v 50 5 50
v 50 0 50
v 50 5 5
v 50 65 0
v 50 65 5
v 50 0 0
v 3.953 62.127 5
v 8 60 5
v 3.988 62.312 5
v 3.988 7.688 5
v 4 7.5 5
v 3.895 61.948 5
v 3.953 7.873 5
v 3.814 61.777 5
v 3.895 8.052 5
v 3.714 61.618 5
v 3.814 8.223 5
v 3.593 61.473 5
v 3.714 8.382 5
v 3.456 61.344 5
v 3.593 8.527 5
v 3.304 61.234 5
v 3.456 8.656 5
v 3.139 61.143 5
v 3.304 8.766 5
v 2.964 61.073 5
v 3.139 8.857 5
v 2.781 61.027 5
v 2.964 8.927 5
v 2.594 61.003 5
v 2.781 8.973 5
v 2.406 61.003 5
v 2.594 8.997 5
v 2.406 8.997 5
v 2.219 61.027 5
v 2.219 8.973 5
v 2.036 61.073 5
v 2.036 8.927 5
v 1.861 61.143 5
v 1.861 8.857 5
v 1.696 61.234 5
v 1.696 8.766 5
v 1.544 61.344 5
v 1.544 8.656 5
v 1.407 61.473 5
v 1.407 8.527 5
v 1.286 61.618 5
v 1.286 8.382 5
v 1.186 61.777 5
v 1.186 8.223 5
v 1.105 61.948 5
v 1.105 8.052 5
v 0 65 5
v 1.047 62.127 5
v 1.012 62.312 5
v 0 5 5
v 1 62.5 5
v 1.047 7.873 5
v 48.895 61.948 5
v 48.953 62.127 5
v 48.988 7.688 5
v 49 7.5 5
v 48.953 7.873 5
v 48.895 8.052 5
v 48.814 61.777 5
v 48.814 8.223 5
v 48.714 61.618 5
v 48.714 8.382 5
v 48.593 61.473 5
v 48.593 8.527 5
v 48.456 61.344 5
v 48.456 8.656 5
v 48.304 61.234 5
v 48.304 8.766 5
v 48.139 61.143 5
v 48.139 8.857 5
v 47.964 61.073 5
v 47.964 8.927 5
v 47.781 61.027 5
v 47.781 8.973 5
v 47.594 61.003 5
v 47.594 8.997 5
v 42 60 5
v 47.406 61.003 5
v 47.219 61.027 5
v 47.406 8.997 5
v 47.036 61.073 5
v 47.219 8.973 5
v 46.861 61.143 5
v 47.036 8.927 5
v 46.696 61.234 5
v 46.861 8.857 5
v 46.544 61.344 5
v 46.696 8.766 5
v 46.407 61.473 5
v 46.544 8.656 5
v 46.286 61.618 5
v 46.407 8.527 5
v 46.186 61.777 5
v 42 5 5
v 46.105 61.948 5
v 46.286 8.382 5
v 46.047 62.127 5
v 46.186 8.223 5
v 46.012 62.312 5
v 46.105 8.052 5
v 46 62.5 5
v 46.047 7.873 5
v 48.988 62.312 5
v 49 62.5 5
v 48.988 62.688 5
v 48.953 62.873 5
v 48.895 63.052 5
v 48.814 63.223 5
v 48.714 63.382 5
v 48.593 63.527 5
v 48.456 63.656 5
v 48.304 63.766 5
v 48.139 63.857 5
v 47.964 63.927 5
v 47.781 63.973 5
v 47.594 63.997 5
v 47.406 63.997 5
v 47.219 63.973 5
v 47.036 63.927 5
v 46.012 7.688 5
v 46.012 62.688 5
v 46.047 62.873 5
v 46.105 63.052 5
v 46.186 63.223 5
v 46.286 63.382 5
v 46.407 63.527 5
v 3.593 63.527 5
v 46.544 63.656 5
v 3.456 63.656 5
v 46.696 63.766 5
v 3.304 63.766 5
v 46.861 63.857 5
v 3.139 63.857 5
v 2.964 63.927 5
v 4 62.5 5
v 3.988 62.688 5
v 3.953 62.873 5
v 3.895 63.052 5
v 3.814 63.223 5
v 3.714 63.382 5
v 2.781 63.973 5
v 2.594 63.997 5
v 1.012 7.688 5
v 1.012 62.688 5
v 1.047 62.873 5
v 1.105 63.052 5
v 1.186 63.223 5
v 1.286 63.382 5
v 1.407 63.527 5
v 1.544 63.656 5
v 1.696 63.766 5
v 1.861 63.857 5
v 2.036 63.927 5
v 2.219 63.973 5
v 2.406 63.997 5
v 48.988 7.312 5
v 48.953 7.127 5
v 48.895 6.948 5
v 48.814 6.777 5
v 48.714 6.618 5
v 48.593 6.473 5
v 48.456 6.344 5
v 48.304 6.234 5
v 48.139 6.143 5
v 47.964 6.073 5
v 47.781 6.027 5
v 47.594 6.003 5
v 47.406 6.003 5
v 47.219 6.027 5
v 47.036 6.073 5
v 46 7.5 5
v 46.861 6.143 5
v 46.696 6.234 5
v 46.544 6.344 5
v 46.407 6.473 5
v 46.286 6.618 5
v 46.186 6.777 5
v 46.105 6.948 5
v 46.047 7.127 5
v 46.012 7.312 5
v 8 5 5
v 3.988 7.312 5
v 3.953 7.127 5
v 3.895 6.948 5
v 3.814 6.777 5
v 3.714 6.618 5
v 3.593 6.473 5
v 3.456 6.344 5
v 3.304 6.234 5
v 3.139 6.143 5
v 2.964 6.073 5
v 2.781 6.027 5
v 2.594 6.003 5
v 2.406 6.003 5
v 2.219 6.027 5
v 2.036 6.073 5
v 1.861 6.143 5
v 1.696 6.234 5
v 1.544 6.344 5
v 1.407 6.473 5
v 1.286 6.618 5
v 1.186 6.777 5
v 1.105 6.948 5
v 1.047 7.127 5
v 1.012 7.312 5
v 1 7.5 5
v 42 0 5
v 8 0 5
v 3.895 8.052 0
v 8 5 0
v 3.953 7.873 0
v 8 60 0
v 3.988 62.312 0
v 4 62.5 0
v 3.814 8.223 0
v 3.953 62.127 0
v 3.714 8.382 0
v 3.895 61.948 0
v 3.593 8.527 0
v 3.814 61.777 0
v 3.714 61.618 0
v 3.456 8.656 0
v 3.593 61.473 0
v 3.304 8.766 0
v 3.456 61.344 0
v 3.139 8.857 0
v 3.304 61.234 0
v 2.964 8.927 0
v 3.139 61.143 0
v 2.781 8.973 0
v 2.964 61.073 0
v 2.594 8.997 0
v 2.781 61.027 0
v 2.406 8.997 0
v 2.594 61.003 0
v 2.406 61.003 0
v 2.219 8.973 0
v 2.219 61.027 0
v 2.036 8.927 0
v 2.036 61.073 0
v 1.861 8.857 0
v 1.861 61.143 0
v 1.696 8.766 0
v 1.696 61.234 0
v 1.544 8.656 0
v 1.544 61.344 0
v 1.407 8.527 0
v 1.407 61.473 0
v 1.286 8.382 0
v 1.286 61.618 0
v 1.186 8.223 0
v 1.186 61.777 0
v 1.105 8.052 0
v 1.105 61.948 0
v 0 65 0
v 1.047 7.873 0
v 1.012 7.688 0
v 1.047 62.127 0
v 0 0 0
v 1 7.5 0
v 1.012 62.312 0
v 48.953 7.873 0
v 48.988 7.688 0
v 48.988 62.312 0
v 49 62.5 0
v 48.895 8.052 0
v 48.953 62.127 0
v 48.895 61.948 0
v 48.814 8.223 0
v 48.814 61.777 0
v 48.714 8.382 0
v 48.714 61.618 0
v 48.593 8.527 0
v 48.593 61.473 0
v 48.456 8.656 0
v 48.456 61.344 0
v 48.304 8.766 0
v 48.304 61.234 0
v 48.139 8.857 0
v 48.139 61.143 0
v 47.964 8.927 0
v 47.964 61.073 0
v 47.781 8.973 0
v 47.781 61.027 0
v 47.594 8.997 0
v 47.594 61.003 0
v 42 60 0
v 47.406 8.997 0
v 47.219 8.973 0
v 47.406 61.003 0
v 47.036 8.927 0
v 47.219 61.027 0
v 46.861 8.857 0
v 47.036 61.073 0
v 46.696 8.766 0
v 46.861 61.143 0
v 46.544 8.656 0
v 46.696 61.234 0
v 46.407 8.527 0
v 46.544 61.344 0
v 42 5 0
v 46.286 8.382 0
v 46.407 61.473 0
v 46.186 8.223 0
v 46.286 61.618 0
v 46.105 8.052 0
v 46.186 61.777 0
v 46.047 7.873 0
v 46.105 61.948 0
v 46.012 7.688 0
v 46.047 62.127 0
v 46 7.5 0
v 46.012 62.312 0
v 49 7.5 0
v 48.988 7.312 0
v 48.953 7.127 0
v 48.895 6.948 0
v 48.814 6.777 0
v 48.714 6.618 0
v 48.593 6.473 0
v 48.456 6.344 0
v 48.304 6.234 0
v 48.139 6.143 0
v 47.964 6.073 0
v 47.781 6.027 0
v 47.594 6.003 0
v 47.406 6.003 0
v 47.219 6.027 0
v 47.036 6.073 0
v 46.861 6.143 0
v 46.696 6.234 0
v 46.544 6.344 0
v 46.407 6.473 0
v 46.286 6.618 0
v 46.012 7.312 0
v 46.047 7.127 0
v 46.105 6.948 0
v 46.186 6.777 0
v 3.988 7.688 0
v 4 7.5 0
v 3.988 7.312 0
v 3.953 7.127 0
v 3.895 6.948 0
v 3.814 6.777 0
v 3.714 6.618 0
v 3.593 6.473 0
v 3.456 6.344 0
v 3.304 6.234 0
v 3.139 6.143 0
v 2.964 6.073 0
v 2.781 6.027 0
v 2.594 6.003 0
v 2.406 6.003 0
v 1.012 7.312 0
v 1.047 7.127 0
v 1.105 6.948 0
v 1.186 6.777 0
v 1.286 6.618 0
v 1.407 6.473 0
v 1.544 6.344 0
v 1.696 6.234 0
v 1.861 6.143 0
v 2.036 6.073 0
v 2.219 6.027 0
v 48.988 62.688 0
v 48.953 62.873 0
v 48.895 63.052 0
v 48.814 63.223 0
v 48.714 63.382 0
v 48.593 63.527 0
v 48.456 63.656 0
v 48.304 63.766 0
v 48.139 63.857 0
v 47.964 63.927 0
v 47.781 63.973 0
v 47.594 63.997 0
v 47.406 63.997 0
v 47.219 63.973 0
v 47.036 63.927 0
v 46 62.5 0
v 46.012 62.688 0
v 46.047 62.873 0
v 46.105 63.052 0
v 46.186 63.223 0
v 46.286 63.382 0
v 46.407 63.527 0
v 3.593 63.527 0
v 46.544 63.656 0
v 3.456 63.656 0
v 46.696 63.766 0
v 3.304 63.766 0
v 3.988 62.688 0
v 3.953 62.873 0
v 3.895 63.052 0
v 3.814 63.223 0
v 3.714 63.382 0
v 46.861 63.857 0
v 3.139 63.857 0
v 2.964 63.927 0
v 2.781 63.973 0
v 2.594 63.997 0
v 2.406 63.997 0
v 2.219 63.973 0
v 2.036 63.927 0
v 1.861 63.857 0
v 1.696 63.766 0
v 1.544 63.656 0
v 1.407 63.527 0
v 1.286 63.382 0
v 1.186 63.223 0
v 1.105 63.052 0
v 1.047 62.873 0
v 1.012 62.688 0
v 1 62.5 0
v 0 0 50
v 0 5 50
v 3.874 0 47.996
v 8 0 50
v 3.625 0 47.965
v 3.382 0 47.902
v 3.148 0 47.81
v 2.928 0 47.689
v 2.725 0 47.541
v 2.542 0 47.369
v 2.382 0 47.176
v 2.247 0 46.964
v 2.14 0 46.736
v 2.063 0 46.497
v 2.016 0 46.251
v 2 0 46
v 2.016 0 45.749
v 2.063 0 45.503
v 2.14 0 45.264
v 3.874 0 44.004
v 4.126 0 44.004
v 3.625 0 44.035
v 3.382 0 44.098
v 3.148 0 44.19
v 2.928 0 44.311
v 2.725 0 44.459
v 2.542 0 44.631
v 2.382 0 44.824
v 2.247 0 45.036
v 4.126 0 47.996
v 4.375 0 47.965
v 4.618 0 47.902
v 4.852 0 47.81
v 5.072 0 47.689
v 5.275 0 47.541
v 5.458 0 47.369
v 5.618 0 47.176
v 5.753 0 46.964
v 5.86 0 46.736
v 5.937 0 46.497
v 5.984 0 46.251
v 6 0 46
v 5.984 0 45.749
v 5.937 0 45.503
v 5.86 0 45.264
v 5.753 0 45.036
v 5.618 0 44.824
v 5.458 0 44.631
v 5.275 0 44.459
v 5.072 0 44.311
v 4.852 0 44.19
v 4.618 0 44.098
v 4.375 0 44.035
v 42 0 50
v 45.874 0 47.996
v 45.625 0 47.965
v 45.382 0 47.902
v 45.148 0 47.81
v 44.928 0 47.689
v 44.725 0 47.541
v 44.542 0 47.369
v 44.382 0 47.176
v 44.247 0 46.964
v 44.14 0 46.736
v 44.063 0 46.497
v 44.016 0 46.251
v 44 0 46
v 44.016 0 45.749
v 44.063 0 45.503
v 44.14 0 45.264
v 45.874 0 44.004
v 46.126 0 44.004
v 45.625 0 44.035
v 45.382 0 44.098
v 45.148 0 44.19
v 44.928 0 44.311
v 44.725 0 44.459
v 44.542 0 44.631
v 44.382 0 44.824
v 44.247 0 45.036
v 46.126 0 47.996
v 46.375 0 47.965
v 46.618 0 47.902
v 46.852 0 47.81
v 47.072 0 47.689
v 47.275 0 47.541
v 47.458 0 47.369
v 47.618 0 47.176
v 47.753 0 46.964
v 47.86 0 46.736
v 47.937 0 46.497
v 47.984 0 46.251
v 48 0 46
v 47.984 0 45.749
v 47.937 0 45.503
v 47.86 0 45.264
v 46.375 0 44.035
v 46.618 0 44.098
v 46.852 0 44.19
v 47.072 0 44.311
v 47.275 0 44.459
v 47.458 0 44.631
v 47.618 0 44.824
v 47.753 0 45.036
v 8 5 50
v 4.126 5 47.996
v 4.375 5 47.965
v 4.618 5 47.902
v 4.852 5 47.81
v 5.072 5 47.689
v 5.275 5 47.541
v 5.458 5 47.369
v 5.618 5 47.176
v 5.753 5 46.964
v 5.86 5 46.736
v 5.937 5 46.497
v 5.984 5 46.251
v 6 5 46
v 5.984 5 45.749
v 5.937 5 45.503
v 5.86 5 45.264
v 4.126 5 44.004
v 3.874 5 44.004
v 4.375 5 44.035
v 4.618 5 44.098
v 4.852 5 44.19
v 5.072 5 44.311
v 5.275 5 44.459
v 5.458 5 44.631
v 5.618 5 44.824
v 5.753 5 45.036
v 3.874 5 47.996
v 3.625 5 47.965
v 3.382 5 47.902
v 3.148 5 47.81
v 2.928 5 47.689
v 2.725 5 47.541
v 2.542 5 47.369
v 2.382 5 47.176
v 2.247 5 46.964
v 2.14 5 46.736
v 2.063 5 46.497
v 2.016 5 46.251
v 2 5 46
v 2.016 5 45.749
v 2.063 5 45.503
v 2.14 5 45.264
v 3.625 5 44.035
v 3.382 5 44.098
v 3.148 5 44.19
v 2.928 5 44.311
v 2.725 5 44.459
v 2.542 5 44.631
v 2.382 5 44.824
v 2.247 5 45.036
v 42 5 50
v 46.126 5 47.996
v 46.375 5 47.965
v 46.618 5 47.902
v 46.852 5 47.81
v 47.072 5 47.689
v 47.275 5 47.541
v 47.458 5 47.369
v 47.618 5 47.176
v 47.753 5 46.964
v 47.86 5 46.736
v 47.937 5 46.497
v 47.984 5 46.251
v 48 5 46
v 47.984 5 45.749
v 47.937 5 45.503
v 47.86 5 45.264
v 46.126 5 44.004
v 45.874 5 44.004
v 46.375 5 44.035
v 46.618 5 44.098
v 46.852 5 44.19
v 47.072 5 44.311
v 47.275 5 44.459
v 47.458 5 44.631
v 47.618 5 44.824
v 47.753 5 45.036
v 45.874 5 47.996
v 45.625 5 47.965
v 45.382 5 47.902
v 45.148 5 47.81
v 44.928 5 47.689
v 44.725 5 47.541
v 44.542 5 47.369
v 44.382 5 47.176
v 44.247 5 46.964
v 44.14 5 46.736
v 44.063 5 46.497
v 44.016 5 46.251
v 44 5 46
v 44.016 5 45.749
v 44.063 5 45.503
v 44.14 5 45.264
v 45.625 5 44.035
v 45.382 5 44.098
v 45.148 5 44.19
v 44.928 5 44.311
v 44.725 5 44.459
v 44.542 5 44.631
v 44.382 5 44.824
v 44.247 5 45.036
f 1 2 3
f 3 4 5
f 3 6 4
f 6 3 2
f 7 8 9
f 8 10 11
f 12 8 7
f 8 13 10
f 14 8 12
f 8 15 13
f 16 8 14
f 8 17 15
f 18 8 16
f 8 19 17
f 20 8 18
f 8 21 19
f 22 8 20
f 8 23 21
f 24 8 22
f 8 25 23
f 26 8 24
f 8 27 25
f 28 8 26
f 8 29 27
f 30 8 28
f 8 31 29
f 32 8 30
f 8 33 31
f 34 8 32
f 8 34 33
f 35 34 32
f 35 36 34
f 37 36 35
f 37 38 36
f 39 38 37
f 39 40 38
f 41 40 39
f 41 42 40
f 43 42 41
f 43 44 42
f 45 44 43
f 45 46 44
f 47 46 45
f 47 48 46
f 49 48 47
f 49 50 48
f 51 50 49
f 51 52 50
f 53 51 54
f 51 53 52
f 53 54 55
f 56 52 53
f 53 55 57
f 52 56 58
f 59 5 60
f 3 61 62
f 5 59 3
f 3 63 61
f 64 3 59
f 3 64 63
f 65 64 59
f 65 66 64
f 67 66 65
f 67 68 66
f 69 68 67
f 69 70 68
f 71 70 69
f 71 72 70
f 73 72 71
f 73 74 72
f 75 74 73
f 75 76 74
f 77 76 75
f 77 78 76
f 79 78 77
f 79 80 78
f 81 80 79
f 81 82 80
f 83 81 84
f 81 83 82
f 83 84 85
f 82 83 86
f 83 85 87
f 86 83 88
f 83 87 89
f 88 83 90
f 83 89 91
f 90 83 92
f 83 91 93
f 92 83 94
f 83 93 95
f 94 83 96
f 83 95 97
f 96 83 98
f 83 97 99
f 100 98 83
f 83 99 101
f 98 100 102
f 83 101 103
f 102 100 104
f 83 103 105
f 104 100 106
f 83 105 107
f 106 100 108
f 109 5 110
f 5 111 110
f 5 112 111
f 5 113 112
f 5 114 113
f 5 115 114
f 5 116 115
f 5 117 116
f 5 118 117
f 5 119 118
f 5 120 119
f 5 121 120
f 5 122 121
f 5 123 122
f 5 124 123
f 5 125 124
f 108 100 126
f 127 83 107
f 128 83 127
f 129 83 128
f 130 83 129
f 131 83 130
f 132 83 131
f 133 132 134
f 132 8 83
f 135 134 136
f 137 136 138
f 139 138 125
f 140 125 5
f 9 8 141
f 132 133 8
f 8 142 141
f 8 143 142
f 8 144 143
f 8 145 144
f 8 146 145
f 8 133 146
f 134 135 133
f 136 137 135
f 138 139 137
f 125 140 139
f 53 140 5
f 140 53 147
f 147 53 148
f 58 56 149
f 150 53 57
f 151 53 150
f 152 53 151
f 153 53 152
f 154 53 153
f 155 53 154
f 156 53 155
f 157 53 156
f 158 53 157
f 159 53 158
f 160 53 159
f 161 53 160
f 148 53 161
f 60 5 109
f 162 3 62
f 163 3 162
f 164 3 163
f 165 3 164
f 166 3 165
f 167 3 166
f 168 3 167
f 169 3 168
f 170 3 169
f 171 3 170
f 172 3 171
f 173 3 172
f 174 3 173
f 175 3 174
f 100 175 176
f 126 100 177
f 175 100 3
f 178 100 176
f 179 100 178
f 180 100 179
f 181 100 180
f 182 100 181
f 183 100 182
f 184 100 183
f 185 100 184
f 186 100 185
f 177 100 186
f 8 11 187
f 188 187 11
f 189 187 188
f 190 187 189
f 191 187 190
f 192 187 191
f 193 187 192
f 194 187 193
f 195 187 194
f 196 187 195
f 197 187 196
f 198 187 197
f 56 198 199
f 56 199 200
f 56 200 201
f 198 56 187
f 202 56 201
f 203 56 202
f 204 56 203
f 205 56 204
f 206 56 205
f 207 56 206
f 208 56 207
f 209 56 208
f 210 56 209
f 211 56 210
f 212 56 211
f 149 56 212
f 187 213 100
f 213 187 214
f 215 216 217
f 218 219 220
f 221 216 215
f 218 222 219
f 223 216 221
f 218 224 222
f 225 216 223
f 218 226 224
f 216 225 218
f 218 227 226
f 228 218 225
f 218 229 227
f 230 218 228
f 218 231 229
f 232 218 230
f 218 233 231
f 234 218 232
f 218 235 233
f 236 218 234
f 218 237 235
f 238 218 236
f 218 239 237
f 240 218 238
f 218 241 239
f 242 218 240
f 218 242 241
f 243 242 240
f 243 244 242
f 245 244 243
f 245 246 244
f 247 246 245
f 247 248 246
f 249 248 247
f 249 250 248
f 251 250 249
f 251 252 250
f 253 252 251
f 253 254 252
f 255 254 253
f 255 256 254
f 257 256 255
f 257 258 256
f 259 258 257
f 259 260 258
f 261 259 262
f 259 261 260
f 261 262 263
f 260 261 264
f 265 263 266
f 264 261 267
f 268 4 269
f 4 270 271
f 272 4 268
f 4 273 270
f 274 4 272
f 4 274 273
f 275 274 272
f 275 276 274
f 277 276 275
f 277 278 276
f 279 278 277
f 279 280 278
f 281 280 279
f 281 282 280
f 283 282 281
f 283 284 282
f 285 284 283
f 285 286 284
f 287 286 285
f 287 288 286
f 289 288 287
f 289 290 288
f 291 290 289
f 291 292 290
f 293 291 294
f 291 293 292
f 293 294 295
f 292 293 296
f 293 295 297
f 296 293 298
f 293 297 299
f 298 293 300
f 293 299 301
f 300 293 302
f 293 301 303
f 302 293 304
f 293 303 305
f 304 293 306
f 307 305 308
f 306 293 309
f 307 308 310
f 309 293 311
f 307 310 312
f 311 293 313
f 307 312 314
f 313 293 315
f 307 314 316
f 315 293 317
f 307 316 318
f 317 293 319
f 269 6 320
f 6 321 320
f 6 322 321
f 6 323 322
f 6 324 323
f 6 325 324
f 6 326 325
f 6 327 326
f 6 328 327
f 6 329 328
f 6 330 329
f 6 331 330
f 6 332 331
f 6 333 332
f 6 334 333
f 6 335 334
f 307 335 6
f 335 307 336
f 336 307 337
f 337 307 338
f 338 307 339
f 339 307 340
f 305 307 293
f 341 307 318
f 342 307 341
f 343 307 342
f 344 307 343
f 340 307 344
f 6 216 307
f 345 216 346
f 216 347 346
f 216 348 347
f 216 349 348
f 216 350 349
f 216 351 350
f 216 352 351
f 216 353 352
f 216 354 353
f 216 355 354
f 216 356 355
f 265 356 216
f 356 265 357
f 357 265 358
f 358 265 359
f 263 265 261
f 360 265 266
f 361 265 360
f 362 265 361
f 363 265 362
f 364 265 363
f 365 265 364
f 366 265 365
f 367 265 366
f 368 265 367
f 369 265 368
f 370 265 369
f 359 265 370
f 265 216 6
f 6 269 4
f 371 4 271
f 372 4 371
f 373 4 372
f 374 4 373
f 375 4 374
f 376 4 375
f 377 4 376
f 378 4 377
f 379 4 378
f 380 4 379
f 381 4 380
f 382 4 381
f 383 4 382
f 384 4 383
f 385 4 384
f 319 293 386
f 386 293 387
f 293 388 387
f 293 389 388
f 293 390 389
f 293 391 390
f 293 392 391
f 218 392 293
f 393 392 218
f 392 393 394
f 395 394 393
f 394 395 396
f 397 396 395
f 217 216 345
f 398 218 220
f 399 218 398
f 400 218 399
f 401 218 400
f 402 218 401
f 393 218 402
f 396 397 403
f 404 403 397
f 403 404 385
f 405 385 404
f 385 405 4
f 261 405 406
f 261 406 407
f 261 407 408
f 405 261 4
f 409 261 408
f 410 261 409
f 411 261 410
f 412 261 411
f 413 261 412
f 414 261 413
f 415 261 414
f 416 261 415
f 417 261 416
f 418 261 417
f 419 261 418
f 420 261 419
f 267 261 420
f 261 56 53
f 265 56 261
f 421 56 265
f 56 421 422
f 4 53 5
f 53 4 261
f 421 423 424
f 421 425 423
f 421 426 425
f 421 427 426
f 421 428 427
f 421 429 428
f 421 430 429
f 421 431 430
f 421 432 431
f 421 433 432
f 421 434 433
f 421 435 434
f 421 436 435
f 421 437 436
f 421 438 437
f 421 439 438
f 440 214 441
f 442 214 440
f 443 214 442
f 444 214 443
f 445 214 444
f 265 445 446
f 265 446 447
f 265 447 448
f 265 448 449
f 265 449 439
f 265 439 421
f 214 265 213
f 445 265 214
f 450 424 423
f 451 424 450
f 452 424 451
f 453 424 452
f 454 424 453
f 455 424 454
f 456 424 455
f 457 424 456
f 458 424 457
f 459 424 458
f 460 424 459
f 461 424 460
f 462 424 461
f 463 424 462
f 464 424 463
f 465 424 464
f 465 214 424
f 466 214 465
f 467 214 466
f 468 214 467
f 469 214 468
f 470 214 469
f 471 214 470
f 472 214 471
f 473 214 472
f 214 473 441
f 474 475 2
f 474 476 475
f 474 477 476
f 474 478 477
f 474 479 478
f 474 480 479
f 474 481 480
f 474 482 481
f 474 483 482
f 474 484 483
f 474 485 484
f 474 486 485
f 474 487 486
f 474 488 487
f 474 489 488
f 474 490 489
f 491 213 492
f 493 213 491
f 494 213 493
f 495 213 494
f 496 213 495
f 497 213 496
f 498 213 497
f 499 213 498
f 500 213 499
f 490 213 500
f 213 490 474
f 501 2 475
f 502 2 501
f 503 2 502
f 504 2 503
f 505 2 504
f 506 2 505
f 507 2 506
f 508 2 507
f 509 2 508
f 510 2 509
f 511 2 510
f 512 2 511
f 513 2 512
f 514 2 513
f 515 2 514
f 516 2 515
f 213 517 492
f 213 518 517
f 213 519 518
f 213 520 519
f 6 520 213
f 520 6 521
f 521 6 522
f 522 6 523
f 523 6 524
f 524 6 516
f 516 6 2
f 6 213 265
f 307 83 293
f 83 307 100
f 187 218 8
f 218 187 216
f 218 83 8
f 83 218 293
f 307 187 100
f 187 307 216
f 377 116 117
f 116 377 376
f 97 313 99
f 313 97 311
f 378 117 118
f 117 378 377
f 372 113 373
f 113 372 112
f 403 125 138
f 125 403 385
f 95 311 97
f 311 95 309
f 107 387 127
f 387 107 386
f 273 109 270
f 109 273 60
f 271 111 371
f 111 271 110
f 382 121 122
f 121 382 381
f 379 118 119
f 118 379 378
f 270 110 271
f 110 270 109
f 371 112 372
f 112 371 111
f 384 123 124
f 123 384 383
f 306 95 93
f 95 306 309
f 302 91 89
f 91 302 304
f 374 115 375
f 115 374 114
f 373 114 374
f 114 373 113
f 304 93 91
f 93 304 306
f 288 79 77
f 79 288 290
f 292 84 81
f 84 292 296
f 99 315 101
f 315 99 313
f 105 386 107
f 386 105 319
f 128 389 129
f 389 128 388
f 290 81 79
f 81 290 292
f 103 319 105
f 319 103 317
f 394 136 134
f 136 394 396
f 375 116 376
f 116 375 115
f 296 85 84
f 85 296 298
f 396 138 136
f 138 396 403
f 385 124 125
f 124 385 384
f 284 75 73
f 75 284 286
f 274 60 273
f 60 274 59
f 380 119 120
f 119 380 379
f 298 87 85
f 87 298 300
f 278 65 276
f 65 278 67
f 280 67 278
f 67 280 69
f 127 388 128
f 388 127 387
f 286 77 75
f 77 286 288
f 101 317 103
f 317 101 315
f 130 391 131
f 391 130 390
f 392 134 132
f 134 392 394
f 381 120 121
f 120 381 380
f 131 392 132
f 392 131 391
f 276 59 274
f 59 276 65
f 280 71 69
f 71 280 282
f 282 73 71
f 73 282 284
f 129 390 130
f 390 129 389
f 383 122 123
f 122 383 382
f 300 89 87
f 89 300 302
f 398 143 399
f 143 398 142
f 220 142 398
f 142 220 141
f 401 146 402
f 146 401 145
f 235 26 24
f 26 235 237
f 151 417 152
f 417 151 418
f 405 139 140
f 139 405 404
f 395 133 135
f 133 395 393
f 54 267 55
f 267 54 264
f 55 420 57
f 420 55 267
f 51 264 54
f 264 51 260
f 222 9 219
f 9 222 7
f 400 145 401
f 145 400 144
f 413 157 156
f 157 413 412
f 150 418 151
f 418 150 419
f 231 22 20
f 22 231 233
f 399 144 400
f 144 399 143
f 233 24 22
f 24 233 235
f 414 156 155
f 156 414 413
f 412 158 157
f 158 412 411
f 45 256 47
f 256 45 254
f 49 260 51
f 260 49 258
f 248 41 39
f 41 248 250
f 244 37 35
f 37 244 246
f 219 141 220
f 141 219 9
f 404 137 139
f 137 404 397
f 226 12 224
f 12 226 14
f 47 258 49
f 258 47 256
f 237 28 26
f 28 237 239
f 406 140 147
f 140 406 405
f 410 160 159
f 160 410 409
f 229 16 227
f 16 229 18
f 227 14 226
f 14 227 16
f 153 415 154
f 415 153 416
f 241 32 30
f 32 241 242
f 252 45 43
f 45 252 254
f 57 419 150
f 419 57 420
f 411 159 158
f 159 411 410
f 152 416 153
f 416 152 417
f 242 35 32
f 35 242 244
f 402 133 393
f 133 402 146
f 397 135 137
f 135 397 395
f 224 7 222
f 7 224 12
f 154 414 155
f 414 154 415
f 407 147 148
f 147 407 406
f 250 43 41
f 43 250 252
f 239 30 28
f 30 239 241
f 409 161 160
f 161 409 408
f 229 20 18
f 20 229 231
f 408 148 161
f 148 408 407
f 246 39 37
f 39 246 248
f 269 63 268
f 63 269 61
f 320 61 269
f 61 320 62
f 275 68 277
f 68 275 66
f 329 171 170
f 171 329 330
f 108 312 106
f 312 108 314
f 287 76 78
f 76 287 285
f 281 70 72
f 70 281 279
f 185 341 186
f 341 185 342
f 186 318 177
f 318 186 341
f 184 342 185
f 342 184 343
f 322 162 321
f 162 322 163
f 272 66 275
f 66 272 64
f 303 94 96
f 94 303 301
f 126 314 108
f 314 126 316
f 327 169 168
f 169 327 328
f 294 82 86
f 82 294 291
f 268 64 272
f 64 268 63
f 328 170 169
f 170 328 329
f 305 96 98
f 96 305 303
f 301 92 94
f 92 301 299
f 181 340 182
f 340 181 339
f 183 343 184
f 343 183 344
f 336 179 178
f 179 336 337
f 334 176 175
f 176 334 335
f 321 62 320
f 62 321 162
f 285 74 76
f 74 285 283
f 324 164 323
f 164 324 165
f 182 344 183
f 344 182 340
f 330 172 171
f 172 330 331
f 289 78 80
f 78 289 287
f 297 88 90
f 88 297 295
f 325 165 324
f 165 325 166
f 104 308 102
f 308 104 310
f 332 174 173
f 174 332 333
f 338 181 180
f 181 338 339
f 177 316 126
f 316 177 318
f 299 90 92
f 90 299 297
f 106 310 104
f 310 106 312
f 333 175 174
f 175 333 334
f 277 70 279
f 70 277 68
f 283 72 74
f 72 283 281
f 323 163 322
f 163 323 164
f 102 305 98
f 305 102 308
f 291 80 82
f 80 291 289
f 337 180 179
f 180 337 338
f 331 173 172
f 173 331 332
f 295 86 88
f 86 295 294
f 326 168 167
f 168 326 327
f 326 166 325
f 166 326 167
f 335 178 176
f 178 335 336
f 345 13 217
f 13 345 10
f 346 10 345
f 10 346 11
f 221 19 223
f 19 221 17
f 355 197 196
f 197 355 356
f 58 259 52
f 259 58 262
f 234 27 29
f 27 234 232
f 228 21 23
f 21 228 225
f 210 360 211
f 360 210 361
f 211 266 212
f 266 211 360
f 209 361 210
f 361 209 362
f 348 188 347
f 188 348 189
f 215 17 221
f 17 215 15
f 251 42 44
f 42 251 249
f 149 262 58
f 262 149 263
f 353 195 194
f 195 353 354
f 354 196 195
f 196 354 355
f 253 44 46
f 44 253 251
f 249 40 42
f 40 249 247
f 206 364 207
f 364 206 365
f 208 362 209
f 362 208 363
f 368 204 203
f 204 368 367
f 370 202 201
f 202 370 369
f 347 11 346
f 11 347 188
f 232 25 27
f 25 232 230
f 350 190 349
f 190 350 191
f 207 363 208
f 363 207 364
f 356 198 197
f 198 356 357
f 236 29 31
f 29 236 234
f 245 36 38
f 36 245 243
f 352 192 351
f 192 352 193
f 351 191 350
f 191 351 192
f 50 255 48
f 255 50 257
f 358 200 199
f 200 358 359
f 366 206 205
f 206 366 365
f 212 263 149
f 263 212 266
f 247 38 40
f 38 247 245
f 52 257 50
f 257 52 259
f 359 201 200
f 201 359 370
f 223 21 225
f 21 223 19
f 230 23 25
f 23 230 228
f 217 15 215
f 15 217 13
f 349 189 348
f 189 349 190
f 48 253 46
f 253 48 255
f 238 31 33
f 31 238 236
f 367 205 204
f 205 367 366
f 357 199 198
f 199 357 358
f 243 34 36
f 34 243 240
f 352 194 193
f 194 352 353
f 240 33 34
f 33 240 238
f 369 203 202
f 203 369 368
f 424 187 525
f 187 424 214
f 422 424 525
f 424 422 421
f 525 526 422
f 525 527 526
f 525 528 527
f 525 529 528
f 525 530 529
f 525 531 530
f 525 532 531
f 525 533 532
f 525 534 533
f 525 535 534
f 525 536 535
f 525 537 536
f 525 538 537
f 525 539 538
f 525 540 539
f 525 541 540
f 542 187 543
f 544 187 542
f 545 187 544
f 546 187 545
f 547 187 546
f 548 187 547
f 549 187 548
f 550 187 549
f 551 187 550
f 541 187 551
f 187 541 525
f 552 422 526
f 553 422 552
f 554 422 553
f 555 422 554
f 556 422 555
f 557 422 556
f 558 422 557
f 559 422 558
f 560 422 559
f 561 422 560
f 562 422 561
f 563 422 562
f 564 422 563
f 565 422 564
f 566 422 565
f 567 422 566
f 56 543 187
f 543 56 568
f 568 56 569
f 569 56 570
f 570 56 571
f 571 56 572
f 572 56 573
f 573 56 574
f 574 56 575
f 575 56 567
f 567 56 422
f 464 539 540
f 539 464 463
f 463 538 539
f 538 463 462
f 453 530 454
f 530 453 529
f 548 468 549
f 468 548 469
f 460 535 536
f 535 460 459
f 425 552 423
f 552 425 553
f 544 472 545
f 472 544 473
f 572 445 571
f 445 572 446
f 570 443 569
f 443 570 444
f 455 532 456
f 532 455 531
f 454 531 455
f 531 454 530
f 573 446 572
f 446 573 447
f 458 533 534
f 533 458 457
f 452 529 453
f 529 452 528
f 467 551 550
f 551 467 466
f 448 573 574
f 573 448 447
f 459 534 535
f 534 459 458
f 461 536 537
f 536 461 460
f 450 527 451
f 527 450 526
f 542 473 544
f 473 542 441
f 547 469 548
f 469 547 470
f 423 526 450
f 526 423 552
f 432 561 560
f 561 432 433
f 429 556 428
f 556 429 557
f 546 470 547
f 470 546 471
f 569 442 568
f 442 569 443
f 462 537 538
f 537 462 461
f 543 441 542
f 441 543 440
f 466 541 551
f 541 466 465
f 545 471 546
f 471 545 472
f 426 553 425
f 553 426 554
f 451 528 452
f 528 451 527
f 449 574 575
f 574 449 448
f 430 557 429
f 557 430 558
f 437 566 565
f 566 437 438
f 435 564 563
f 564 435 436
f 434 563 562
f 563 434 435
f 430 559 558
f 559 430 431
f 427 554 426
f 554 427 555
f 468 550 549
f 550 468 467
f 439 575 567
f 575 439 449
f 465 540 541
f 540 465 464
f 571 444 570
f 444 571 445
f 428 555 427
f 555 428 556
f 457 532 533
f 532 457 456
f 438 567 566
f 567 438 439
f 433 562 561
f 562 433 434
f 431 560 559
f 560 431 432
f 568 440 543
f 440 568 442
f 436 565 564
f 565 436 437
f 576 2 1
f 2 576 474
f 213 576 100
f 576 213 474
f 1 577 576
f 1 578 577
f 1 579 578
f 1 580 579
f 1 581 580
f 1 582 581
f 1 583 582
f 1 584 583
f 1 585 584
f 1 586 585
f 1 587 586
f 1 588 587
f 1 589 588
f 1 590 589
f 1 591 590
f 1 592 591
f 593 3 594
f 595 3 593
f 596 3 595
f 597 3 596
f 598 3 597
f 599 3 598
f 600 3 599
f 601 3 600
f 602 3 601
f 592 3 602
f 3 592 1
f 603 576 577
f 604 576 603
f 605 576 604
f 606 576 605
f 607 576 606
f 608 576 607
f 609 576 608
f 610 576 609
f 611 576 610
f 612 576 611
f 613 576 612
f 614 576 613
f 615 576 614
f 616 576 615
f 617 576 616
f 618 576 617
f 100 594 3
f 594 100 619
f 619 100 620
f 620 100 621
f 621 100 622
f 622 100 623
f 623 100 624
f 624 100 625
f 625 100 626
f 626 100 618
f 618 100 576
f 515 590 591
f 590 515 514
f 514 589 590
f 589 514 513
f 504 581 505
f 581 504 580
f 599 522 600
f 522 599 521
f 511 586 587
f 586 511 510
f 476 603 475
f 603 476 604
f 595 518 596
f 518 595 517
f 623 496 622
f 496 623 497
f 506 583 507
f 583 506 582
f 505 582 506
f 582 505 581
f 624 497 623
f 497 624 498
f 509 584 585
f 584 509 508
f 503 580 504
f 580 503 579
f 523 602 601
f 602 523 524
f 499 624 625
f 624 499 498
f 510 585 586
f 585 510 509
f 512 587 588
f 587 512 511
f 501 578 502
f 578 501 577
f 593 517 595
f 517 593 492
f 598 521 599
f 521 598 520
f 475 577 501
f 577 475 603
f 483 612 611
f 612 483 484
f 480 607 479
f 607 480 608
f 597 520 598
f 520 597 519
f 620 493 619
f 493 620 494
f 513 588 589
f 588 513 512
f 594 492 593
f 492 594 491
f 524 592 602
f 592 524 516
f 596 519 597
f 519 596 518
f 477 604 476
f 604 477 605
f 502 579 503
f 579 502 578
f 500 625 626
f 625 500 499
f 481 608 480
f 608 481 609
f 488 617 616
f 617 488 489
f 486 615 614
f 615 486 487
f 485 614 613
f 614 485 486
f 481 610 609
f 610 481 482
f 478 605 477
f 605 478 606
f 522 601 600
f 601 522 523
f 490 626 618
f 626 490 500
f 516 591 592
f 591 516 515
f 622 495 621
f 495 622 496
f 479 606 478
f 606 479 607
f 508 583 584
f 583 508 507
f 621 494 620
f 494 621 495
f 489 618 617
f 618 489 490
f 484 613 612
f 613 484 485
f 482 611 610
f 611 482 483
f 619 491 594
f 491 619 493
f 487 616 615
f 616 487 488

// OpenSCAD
$fn=50;
depth=65;
length=50;
height=50;
holesR=1.5;
holesWallR=2;


difference(){
cube([length, depth, 5]);
translate([8,5,0])
cube([length-16,depth-10,5]);
translate([length-2.5,depth-2.5,0])    
cylinder(10,holesR,holesR);
translate([2.5,depth-2.5,0])    
cylinder(10,holesR,holesR);
translate([length-2.5,7.5,0])    
cylinder(10,holesR,holesR);
translate([2.5,7.5,0])    
cylinder(10,holesR,holesR);
}

difference(){
cube([8,5,height]);
translate([4,0,height-4])
rotate([270,0,0])
cylinder(5,holesWallR,holesWallR);
}

difference(){
translate([length-8,0,0])
cube([8,5,height]);
translate([length-4,0,height-4])
rotate([270,0,0])
cylinder(5,holesWallR,holesWallR);
}
